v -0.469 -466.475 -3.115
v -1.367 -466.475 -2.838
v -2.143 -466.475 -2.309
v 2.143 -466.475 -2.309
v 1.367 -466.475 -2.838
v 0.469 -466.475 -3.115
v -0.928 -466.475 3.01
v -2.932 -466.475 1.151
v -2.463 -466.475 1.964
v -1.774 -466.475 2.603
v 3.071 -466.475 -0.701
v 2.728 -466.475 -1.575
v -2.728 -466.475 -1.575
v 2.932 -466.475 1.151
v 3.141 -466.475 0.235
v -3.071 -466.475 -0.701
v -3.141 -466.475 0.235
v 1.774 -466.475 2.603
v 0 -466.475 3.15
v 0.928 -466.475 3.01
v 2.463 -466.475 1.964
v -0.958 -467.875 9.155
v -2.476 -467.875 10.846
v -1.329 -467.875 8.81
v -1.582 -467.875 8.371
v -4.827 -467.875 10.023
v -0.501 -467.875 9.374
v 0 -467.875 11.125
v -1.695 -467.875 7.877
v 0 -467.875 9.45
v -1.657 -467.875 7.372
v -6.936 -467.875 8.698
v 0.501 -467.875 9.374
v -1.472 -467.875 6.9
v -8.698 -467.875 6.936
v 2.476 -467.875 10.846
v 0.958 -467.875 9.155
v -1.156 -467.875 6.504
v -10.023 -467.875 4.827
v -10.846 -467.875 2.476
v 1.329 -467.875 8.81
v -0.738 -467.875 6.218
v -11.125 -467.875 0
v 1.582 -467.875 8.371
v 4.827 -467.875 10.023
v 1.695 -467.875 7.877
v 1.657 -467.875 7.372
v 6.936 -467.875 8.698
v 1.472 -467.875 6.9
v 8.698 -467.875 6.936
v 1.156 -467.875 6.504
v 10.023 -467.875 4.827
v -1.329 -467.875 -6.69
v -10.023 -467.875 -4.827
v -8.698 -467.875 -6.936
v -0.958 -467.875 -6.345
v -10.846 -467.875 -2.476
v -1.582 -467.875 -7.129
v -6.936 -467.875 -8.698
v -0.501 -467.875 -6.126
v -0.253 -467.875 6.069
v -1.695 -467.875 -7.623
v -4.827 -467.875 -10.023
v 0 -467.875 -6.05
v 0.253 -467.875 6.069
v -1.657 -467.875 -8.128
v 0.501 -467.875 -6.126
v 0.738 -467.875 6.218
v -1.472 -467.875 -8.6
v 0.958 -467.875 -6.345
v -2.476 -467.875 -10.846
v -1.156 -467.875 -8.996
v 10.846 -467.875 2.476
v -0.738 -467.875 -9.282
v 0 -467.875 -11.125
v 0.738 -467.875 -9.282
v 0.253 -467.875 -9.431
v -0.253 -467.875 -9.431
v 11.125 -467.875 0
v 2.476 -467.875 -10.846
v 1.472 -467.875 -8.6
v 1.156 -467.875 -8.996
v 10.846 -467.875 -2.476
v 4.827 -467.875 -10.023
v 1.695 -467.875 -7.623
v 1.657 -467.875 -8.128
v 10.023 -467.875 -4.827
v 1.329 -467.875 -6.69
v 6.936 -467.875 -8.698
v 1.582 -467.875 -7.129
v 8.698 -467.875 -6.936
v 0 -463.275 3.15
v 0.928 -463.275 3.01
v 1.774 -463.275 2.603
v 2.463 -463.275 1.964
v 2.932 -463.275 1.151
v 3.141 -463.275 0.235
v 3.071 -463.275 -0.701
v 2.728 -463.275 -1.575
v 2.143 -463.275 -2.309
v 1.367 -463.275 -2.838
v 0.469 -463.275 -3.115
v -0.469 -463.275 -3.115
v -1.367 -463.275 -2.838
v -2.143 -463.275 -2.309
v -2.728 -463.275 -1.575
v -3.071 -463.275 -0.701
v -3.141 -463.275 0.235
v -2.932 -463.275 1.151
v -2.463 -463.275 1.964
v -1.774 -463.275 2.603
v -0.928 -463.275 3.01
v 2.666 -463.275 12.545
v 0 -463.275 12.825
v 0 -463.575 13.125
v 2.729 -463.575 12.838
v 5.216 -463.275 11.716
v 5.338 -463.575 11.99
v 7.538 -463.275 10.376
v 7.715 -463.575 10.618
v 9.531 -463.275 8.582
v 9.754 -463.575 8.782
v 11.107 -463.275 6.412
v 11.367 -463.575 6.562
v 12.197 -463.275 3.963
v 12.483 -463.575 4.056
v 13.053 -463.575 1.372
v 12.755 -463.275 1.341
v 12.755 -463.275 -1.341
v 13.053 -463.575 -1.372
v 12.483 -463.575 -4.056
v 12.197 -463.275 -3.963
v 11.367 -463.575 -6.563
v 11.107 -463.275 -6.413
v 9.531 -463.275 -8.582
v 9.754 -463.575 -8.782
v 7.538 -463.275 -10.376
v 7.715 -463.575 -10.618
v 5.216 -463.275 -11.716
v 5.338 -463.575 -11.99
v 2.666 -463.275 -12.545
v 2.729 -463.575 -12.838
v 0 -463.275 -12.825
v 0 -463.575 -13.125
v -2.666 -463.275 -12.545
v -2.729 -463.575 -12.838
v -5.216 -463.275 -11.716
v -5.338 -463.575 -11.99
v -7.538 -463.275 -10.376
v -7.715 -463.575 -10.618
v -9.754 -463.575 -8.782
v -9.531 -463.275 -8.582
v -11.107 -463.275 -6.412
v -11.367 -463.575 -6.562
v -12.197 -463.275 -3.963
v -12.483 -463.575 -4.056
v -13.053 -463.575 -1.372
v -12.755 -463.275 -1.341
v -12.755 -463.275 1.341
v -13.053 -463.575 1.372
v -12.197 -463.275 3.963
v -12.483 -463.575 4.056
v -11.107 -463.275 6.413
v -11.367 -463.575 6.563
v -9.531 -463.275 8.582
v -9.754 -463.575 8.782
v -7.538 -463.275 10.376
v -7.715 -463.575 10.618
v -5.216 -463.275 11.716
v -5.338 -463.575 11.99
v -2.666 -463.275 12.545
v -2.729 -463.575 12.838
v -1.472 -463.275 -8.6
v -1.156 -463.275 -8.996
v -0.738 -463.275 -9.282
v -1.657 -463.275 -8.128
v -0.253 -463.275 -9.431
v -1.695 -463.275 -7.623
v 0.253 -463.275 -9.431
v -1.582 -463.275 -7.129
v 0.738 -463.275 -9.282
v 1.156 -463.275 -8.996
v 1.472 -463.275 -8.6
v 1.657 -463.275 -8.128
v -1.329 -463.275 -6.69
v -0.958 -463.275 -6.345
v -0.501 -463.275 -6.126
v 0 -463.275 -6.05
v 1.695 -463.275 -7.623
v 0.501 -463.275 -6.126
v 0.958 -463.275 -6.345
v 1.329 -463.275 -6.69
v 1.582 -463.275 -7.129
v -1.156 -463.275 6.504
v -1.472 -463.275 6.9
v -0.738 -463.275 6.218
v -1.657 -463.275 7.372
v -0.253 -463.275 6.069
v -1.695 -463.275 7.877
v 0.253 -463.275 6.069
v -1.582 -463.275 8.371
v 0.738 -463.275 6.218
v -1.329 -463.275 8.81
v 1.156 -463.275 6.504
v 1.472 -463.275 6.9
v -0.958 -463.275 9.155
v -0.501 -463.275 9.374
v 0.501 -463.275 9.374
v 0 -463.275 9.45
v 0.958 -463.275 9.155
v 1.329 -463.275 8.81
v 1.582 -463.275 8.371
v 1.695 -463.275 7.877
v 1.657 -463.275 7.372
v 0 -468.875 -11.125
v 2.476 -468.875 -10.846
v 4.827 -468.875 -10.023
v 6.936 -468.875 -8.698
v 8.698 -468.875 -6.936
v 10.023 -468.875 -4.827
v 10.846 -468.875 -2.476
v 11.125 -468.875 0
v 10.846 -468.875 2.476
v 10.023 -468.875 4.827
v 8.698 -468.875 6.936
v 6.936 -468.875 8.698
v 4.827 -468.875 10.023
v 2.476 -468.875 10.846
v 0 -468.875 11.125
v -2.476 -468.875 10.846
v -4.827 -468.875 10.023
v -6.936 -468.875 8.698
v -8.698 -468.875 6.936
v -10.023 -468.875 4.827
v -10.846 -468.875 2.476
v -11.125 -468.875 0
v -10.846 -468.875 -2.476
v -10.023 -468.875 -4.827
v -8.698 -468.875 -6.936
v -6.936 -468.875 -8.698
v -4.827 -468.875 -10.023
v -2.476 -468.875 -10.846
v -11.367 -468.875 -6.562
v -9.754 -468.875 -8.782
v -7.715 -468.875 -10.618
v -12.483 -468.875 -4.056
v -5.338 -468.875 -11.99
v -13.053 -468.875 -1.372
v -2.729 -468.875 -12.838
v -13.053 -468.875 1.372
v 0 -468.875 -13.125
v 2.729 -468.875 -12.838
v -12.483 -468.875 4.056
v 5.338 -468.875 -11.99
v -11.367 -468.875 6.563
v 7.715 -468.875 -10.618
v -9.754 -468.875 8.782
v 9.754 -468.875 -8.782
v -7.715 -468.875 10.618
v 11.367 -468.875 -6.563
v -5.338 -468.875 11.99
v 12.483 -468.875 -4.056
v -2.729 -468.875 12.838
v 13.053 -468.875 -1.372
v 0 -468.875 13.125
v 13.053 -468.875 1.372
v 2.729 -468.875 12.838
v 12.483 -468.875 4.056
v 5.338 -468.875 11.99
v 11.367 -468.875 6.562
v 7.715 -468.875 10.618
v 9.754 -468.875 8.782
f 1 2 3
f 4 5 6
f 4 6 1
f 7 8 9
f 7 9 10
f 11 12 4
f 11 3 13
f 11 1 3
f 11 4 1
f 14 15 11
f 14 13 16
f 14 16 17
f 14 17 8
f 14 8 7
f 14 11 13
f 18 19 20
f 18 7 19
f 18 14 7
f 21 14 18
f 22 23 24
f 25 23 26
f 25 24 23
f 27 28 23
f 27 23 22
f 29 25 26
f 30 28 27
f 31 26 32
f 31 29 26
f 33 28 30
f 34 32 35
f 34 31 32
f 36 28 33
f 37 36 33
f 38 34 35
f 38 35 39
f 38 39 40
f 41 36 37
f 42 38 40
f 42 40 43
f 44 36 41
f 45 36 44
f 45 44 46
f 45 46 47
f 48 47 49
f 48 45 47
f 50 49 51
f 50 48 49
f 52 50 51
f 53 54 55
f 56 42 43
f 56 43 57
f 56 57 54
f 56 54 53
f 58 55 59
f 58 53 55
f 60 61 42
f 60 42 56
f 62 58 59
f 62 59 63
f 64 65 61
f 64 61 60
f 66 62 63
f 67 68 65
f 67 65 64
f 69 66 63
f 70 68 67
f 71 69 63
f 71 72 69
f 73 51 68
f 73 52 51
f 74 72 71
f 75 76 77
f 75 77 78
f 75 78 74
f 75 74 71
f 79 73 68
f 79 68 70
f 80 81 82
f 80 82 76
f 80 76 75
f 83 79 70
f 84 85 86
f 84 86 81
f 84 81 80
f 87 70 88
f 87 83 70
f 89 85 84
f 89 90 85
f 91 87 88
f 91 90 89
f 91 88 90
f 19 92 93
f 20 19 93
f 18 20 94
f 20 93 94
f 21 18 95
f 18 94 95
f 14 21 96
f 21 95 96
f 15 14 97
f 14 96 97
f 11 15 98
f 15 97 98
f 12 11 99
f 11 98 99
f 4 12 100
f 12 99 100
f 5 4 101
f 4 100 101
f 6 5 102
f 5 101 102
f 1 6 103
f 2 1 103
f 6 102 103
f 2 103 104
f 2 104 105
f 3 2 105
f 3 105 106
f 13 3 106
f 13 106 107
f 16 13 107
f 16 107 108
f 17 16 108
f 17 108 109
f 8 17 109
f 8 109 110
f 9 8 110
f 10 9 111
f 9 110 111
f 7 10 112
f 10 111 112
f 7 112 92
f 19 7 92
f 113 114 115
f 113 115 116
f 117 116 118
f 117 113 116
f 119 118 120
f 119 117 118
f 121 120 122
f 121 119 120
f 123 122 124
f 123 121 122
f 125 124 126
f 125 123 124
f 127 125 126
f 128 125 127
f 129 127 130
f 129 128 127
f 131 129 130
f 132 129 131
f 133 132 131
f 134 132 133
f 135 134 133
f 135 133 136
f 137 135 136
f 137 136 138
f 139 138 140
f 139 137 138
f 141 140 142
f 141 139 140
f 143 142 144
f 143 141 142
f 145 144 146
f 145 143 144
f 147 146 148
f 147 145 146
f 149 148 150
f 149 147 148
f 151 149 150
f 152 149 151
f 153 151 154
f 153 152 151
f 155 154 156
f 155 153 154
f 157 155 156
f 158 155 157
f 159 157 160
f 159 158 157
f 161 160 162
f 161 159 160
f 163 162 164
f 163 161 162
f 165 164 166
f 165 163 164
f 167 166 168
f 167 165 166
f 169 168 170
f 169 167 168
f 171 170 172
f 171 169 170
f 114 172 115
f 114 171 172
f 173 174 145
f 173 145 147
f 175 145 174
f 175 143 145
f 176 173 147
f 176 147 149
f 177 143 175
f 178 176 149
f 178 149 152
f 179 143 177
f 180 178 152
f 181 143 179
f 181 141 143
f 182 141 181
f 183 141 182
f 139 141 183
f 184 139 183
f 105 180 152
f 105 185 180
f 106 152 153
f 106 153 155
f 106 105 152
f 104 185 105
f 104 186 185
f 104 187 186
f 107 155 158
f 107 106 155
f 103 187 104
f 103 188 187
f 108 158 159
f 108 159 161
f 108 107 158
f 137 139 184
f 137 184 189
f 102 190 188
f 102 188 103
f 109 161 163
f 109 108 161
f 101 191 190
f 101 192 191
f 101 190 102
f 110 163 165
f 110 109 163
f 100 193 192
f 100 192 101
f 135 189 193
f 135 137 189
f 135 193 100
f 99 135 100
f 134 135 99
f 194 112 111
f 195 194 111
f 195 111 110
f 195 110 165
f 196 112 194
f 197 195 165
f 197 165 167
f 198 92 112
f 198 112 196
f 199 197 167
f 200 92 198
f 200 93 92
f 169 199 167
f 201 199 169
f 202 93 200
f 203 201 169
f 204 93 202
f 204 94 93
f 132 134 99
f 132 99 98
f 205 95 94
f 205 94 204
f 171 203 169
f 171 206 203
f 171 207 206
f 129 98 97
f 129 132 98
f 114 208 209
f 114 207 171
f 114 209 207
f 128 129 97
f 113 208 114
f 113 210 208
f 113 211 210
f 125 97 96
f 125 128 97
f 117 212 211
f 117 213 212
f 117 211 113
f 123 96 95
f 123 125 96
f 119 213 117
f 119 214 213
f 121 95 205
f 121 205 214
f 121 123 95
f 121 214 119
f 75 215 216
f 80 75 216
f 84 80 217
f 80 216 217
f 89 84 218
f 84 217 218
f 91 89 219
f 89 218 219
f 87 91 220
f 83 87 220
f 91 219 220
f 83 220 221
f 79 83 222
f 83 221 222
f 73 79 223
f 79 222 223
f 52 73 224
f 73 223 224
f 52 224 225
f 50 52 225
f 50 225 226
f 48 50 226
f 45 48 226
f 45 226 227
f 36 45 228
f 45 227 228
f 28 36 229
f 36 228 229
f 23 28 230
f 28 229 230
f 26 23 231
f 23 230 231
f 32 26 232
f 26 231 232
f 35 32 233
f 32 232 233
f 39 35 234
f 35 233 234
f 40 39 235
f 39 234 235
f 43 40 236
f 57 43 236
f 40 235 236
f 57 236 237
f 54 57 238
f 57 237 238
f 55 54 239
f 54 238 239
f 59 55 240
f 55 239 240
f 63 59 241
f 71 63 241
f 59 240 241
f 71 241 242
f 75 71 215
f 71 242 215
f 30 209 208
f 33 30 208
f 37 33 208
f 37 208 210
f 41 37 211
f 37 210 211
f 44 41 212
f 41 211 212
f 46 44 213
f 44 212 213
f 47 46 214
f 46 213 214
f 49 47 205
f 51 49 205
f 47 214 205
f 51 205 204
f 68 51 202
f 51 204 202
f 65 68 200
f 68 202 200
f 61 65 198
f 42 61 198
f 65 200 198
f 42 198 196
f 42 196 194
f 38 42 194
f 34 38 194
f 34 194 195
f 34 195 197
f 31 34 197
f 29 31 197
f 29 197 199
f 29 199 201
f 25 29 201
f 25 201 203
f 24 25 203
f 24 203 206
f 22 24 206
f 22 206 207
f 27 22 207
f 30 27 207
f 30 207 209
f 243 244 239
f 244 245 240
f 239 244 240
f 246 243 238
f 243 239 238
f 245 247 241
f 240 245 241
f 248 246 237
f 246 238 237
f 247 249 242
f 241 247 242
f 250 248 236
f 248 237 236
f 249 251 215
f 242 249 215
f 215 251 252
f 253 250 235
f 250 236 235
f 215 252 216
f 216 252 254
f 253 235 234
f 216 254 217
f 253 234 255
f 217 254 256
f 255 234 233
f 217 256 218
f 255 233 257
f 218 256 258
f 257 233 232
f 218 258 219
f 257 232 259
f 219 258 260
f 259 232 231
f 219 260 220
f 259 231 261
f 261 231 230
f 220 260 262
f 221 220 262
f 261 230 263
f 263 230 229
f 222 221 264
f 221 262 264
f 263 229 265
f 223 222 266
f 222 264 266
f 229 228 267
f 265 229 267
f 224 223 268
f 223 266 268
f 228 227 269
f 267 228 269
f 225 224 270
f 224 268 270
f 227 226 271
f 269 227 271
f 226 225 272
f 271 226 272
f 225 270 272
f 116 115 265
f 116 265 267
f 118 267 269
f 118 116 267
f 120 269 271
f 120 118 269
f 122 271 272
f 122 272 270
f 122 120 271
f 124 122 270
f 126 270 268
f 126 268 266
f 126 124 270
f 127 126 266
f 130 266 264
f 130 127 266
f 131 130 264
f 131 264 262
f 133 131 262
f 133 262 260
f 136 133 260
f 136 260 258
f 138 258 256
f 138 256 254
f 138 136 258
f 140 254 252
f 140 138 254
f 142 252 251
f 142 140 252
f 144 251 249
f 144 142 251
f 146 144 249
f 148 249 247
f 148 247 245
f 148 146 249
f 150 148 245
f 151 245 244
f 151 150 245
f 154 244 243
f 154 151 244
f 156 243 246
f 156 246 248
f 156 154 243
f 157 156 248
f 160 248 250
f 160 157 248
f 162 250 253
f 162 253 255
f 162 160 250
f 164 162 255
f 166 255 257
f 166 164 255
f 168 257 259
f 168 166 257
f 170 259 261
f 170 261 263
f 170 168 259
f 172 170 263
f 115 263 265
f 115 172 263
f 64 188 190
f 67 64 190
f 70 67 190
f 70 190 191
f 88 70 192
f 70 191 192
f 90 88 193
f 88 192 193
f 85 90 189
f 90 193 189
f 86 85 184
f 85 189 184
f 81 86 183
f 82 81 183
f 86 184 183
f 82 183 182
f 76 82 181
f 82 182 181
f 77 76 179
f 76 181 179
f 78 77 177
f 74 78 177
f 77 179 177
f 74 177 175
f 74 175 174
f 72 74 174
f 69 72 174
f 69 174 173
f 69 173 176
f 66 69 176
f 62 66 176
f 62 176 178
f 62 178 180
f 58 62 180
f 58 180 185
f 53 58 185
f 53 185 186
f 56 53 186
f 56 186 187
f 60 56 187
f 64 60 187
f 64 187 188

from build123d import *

# Parameters (mm, degrees)
SKETCH8_R           = 13.125
BOSS_EXTRUDE2_DEPTH = 5.6
SKETCH9_R           = 11.125
CUT_EXTRUDE4_DEPTH  = 1
SKETCH10_R          = 3.15
CUT_EXTRUDE5_DEPTH  = 3.2
CHAMFER2_SIZE       = 0.3
SKETCH11_R          = 1.7
CUT_EXTRUDE6_DEPTH  = 20.38791505


with BuildPart() as part:
    # Sketch8 → Boss-Extrude2 (new body)
    with BuildSketch(Plane(origin=(0, -463.275483874, 0), x_dir=(0.32790942623068436, 0, 0.9447091659283631), z_dir=(0, 1, 0))):
        with Locations(Location((0, 0, 0), (0, 0, 340.858064804))):
            Circle(SKETCH8_R)
    extrude(amount=-BOSS_EXTRUDE2_DEPTH)

    # Sketch9 → Cut-Extrude4 (cut)
    with BuildSketch(Plane(origin=(0, -468.875483874, 0), x_dir=(-1, 0, 0), z_dir=(0, -1, 0))):
        with Locations(Location((0, 0, 0), (0, 0, 90))):
            Circle(SKETCH9_R)
    extrude(amount=-CUT_EXTRUDE4_DEPTH, mode=Mode.SUBTRACT)

    # Sketch10 → Cut-Extrude5 (cut)
    with BuildSketch(Plane(origin=(0, -463.275483874, 0), x_dir=(1, 0, 0), z_dir=(0, 1, 0))):
        with Locations(Location((0, 0, 0), (0, 0, 270))):
            Circle(SKETCH10_R)
    extrude(amount=-CUT_EXTRUDE5_DEPTH, mode=Mode.SUBTRACT)

    # Chamfer2
    chamfer2_edges = [part.edges().sort_by_distance(p)[0] for p in [
        (0, -463.275483874, -13.125),
    ]]
    chamfer(chamfer2_edges, length=CHAMFER2_SIZE)

    # Sketch11 → Cut-Extrude6 (cut, through all)
    with BuildSketch(Plane(origin=(0, -463.275483874, 0), x_dir=(1, 0, 0), z_dir=(0, 1, 0))):
        with Locations(Location((0, -7.75, 0), (0, 0, 270))):
            Circle(SKETCH11_R)
        with Locations(Location((0, 7.75, 0), (0, 0, 270))):
            Circle(SKETCH11_R)
    extrude(amount=-CUT_EXTRUDE6_DEPTH, mode=Mode.SUBTRACT)


solid = part.part
